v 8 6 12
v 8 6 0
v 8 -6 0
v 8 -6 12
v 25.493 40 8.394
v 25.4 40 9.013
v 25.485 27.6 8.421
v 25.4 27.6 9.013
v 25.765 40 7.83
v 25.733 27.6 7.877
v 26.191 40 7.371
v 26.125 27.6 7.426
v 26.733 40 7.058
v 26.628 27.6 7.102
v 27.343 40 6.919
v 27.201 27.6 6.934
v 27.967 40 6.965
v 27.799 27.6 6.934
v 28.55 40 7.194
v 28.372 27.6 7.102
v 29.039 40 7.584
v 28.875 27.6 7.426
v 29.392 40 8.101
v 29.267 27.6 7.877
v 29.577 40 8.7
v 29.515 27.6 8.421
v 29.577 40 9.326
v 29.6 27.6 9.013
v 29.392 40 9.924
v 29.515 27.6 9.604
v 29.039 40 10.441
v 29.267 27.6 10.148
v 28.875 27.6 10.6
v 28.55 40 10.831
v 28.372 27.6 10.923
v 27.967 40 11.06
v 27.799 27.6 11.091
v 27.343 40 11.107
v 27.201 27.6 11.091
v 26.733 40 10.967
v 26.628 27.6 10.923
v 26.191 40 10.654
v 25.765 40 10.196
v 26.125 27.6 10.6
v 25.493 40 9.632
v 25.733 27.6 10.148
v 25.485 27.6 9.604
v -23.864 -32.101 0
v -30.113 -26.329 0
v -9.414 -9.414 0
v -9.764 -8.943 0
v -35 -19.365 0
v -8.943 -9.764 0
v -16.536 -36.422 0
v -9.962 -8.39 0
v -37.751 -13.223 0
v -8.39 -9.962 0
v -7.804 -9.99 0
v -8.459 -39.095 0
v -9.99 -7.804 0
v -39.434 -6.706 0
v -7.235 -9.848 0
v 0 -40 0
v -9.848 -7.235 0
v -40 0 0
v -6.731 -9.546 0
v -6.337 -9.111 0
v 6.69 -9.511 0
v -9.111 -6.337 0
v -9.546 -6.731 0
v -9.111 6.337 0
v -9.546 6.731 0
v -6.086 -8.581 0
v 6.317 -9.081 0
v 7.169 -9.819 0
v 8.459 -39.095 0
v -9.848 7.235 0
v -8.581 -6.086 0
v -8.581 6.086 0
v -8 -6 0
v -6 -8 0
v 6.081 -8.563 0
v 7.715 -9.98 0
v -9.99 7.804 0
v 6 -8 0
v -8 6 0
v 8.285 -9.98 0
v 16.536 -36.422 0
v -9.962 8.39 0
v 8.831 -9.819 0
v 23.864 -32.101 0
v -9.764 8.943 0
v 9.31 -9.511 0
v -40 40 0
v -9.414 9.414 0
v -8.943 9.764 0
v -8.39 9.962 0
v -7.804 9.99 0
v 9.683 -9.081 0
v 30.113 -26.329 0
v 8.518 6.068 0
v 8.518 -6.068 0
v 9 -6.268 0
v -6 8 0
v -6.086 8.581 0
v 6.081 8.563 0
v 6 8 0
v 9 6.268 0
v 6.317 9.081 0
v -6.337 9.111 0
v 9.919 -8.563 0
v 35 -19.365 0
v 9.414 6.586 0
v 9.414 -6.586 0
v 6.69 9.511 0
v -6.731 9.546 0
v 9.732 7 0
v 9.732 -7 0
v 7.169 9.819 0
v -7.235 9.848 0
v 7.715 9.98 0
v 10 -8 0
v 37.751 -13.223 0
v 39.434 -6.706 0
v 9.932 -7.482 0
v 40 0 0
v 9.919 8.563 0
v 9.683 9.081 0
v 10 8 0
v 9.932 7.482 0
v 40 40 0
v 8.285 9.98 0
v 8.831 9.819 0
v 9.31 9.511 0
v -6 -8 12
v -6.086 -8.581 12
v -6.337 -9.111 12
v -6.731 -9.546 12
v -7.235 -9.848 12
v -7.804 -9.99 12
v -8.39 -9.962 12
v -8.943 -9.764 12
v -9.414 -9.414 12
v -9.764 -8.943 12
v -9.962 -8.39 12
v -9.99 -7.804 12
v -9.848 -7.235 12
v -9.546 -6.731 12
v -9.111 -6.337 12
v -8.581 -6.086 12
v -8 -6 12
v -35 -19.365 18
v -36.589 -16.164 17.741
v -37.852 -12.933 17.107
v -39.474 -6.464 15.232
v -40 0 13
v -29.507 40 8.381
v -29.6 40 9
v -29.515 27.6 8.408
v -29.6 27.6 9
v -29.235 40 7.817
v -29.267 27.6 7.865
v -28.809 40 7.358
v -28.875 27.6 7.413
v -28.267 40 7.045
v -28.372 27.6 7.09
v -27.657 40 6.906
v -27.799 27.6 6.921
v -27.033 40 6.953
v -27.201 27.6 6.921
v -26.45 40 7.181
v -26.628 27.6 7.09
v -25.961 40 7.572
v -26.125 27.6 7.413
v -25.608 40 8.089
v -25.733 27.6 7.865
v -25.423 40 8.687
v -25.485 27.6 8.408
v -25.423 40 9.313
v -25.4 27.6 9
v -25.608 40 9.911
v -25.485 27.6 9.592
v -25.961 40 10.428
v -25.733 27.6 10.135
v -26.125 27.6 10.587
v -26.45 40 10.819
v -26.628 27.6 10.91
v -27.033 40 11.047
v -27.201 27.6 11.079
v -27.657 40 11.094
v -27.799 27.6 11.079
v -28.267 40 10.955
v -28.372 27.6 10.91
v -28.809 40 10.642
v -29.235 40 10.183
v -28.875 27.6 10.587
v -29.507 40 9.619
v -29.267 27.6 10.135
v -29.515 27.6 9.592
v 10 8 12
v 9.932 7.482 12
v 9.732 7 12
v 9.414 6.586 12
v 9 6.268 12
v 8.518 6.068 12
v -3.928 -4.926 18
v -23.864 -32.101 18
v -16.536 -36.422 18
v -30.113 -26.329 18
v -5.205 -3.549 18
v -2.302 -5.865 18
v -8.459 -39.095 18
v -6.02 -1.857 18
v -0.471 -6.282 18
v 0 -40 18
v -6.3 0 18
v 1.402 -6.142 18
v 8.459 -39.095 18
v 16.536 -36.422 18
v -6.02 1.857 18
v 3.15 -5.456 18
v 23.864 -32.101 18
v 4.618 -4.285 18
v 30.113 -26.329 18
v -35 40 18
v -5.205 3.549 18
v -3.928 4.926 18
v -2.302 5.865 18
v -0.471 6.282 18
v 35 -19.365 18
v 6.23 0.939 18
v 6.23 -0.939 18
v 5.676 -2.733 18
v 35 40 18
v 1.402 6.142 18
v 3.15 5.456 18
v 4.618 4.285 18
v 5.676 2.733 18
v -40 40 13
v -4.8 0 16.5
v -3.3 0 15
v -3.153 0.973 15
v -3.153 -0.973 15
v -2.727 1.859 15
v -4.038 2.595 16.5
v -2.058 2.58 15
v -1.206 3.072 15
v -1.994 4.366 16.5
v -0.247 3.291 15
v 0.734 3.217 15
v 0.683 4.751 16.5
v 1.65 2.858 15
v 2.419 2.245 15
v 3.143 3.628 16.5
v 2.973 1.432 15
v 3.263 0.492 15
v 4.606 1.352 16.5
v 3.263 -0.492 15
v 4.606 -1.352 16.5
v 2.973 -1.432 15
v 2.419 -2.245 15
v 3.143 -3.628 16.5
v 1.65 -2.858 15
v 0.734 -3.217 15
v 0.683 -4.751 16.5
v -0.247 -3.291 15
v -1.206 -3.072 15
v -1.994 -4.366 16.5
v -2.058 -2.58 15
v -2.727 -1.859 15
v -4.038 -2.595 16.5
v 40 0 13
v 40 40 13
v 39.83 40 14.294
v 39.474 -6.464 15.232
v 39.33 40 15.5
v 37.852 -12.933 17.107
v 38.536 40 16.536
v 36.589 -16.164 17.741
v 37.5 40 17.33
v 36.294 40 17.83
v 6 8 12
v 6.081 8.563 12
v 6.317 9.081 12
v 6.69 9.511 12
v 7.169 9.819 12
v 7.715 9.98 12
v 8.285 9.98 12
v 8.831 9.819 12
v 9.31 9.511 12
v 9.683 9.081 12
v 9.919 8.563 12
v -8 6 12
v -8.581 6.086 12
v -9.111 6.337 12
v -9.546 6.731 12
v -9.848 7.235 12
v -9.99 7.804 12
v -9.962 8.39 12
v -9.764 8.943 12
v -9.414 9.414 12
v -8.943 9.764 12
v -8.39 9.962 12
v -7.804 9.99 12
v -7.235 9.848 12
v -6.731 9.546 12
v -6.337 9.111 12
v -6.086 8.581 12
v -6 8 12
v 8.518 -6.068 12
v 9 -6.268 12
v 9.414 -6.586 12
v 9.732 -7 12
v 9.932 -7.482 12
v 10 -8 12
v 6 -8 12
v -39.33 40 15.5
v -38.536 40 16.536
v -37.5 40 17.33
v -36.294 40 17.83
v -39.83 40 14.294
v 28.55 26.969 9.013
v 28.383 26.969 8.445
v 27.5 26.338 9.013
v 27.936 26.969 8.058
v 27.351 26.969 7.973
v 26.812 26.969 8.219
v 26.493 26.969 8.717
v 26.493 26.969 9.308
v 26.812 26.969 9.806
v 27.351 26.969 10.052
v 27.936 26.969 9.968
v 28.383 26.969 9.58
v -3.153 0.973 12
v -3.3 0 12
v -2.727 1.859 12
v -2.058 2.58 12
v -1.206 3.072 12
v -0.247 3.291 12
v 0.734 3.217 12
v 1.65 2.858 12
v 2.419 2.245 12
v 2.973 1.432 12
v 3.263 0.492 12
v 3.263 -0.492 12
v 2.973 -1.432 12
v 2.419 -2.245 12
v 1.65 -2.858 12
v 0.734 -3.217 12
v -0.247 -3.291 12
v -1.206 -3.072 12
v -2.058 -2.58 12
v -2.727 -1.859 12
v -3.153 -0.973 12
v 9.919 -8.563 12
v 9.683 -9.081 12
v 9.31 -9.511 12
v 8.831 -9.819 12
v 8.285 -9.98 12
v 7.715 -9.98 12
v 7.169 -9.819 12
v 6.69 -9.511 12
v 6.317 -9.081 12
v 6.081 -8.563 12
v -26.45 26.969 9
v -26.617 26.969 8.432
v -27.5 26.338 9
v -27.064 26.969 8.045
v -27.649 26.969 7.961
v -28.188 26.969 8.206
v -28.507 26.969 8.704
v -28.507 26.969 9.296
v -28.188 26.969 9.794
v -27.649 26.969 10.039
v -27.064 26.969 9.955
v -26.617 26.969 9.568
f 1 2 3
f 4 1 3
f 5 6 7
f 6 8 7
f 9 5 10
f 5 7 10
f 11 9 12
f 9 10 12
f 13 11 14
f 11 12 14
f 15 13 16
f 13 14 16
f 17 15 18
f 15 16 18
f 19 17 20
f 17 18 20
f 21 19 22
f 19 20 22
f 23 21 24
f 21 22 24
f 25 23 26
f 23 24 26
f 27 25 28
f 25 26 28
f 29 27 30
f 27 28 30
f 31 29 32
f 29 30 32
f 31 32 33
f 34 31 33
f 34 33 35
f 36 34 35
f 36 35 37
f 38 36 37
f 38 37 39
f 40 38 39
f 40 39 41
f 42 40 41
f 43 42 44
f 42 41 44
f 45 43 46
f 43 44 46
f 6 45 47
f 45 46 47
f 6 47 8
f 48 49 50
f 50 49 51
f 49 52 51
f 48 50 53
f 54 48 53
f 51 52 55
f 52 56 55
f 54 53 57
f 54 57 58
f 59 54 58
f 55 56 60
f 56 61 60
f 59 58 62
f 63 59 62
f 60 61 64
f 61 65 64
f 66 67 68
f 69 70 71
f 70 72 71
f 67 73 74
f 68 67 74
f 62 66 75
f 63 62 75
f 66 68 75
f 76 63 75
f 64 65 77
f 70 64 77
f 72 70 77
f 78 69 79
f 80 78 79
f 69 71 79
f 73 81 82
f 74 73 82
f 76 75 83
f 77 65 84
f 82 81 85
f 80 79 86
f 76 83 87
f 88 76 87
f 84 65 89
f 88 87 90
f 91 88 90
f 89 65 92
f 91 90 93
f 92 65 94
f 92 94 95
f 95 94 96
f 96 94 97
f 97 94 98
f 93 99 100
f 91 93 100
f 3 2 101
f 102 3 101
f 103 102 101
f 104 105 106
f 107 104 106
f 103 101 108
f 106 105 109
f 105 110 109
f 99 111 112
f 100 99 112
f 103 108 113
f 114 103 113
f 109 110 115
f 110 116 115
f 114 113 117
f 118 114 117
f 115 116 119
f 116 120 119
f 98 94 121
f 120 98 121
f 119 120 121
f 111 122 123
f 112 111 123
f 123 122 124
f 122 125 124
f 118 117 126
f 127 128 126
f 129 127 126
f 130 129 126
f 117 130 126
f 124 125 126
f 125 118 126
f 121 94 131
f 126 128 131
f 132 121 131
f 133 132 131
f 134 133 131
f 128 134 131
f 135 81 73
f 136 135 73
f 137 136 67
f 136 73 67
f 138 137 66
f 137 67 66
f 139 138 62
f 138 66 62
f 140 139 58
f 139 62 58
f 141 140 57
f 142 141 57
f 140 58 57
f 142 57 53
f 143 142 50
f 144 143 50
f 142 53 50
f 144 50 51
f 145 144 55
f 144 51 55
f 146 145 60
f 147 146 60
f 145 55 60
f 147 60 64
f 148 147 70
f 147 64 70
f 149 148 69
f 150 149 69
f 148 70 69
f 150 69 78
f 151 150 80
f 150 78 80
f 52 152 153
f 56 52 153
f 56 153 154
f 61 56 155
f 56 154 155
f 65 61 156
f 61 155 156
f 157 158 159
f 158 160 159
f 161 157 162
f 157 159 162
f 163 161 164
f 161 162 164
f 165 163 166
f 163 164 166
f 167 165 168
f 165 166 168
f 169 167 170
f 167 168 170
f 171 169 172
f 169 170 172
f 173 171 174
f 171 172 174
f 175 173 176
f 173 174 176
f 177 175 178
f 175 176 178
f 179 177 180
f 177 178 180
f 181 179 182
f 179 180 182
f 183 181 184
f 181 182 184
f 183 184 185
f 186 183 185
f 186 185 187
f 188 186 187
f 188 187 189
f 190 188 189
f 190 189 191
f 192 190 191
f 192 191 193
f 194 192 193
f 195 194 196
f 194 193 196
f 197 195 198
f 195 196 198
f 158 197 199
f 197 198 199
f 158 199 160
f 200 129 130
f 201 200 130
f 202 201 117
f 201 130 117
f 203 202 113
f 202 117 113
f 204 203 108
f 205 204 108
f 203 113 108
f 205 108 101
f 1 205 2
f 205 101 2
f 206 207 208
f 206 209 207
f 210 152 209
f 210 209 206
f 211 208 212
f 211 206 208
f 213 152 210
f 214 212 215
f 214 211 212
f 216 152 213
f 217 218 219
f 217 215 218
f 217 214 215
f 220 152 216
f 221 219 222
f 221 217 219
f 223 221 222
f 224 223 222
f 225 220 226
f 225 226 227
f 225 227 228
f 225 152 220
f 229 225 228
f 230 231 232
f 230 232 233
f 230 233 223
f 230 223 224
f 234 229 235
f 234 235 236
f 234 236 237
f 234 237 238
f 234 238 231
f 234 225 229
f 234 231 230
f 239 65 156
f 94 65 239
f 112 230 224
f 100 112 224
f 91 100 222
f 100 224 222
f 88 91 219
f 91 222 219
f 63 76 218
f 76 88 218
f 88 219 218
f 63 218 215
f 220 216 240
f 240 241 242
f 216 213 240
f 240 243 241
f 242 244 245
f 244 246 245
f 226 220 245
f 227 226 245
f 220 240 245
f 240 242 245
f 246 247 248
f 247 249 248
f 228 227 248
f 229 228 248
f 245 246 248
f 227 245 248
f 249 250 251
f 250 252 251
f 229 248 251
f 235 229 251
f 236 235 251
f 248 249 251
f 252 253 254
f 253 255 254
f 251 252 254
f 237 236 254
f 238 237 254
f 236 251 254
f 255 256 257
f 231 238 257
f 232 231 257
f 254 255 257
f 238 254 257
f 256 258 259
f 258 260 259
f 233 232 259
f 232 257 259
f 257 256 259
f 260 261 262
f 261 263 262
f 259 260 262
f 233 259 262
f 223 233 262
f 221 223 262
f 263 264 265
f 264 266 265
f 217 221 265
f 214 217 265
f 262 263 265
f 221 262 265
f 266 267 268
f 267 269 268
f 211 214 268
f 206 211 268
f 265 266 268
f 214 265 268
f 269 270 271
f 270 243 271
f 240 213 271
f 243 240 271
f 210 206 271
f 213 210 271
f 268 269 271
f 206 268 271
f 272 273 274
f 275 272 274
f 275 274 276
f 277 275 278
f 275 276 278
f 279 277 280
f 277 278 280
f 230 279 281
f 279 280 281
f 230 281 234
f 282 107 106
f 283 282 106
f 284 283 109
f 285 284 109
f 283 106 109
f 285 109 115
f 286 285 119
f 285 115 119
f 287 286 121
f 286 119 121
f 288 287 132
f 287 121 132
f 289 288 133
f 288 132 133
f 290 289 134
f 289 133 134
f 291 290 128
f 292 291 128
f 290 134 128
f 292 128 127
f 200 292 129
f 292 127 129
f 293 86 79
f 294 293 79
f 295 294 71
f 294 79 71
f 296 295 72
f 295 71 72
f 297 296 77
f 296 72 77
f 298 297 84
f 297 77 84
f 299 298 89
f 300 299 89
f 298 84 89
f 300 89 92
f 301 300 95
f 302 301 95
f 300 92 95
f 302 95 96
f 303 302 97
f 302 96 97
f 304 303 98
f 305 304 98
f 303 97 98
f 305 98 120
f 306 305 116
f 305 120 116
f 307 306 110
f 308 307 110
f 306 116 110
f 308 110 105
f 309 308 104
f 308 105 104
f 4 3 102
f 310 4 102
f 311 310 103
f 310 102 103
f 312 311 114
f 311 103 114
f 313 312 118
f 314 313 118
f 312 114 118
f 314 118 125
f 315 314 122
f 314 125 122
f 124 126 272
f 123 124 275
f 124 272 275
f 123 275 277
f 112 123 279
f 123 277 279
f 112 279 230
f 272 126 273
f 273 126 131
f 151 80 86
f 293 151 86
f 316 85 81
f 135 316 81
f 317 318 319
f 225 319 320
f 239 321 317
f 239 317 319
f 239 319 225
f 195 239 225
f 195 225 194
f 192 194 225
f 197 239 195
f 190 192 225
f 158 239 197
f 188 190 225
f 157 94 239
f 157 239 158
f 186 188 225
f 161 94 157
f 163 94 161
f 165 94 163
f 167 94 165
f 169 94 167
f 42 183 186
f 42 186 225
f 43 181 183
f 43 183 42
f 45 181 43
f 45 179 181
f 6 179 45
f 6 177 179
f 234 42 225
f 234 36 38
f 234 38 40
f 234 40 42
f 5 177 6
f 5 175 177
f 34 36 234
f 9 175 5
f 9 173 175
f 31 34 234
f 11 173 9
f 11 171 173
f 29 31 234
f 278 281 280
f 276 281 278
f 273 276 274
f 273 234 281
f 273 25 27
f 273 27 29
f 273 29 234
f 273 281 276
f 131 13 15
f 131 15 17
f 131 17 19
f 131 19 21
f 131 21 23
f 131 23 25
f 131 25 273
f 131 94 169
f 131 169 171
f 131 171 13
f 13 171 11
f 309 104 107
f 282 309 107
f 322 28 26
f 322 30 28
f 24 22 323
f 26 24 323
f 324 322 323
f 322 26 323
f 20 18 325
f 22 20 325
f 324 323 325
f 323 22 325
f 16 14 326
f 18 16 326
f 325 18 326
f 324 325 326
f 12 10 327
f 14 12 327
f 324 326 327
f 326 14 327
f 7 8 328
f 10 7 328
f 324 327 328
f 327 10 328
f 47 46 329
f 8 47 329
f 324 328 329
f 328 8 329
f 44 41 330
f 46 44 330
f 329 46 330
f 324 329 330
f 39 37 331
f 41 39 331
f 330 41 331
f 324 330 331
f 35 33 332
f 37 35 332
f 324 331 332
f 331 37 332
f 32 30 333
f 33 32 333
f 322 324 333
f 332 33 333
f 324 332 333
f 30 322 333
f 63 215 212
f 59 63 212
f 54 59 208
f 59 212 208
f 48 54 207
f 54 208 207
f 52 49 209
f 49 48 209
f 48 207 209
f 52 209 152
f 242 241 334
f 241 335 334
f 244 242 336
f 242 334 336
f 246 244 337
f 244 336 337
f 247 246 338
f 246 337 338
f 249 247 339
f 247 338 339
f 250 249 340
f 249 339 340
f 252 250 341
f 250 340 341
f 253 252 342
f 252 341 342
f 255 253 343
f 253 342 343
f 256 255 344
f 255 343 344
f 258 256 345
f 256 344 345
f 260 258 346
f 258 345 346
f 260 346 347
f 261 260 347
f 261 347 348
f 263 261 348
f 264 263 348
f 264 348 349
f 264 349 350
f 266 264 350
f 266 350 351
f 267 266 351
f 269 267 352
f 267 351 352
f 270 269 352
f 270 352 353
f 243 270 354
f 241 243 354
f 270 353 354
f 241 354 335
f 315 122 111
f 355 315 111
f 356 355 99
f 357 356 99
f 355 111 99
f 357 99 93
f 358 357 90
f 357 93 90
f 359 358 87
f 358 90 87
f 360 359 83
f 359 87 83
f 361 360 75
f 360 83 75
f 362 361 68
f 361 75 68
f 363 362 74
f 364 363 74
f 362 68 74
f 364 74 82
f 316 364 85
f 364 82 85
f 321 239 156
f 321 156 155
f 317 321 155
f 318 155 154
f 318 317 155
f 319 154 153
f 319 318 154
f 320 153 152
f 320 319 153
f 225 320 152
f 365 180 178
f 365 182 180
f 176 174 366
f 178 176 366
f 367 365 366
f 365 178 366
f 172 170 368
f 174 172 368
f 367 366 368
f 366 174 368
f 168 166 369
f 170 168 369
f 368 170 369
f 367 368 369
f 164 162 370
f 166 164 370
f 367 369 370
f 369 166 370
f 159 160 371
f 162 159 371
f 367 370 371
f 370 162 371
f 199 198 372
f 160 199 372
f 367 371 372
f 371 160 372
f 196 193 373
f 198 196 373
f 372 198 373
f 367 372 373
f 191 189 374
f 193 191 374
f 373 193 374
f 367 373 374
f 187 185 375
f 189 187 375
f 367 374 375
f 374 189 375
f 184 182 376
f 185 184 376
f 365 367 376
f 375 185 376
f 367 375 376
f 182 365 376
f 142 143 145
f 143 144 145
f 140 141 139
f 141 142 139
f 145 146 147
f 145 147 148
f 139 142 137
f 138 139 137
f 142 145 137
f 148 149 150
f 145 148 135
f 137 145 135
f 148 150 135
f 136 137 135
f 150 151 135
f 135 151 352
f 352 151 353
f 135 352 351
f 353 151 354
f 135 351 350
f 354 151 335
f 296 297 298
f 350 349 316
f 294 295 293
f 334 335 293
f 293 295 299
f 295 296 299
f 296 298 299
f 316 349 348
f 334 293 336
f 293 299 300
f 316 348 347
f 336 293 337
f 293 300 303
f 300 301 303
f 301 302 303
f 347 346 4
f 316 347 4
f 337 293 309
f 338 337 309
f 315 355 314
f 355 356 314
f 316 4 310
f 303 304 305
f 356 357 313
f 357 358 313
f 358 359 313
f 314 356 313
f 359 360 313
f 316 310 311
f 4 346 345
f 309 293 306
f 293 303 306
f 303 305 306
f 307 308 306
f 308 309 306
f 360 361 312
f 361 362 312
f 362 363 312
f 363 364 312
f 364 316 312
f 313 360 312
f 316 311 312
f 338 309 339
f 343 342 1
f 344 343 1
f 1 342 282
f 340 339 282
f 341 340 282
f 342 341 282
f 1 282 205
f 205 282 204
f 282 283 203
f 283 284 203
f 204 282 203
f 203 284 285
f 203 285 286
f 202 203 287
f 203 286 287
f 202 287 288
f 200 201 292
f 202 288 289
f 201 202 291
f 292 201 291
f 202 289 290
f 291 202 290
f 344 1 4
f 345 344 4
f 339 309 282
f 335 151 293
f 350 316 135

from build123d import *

# Parameters (mm, degrees)
SKETCH1_W                                           = 80
SKETCH1_H                                           = 80
BOSS_EXTRUDE1_DEPTH                                 = 12
SKETCH2_W                                           = 80
SKETCH2_H                                           = 80
SKETCH2_R                                           = 1.5
BOSS_EXTRUDE2_DEPTH                                 = 6
CSK_FOR_M6_COUNTERSUNK_FLAT_HEAD_SCREW1_D           = 6.6
CSK_FOR_M6_COUNTERSUNK_FLAT_HEAD_SCREW1_DEPTH       = 10
CSK_FOR_M6_COUNTERSUNK_FLAT_HEAD_SCREW1_CSINK_D     = 12.6
CSK_FOR_M6_COUNTERSUNK_FLAT_HEAD_SCREW1_CSINK_ANGLE = 90
CSK_FOR_M6_COUNTERSUNK_FLAT_HEAD_SCREW1_TIP         = 1.982840043
FILLET1_R                                           = 5
M5_TAPPED_HOLE1_D                                   = 4.2
M5_TAPPED_HOLE1_DEPTH                               = 12.4
M5_TAPPED_HOLE1_TIP                                 = 1.2618073
CUT_EXTRUDE1_DEPTH                                  = 60.363288319


with BuildPart() as part:
    # Sketch1 → Boss-Extrude1 (new body)
    with BuildSketch(Plane.XY):
        Rectangle(SKETCH1_W, SKETCH1_H)
        with BuildLine():
            Line((6, -8), (-6, -8))
            ThreePointArc((-6, -8), (-9.414213562, -9.414213562), (-8, -6))
            Line((-8, -6), (-8, 6))
            ThreePointArc((-8, 6), (-9.414213562, 9.414213562), (-6, 8))
            Line((-6, 8), (6, 8))
            ThreePointArc((6, 8), (8, 10), (10, 8))
            ThreePointArc((10, 8), (9.414213562, 6.585786438), (8, 6))
            Line((8, 6), (8, -6))
            ThreePointArc((8, -6), (9.414213562, -6.585786438), (10, -8))
            ThreePointArc((10, -8), (8, -10), (6, -8))
        make_face(mode=Mode.SUBTRACT)
    extrude(amount=BOSS_EXTRUDE1_DEPTH)

    # Sketch2 → Boss-Extrude2 (add)
    with BuildSketch(Plane.XY.offset(12)):
        Rectangle(SKETCH2_W, SKETCH2_H)
        Circle(SKETCH2_R, mode=Mode.SUBTRACT)
    extrude(amount=BOSS_EXTRUDE2_DEPTH)

    # CSK for M6 Countersunk Flat Head Screw1
    with Locations(Plane.XY.offset(18)):
        with Locations((0, 0)):
            CounterSinkHole(CSK_FOR_M6_COUNTERSUNK_FLAT_HEAD_SCREW1_D / 2, CSK_FOR_M6_COUNTERSUNK_FLAT_HEAD_SCREW1_CSINK_D / 2, depth=CSK_FOR_M6_COUNTERSUNK_FLAT_HEAD_SCREW1_DEPTH, counter_sink_angle=CSK_FOR_M6_COUNTERSUNK_FLAT_HEAD_SCREW1_CSINK_ANGLE)
            with Locations((0, 0, -(CSK_FOR_M6_COUNTERSUNK_FLAT_HEAD_SCREW1_DEPTH + CSK_FOR_M6_COUNTERSUNK_FLAT_HEAD_SCREW1_TIP / 2))):  # 118° drill point
                Cone(0, CSK_FOR_M6_COUNTERSUNK_FLAT_HEAD_SCREW1_D / 2, CSK_FOR_M6_COUNTERSUNK_FLAT_HEAD_SCREW1_TIP, mode=Mode.SUBTRACT)

    # Fillet1
    fillet1_edges = [part.edges().sort_by_distance(p)[0] for p in [
        (-40, 0, 18),
        (40, 0, 18),
    ]]
    fillet(fillet1_edges, radius=FILLET1_R)

    # M5 Tapped Hole1
    with Locations(Plane(origin=(0, 40, 0), x_dir=(1, 0, 0), z_dir=(0, 1, 0))):
        with Locations((-27.5, -9), (27.5, -9.012634245)):
            Hole(M5_TAPPED_HOLE1_D / 2, depth=M5_TAPPED_HOLE1_DEPTH)
            with Locations((0, 0, -(M5_TAPPED_HOLE1_DEPTH + M5_TAPPED_HOLE1_TIP / 2))):  # 118° drill point
                Cone(0, M5_TAPPED_HOLE1_D / 2, M5_TAPPED_HOLE1_TIP, mode=Mode.SUBTRACT)

    # Sketch7 → Cut-Extrude1 (cut, through all)
    with BuildSketch(Plane.XY.offset(18)):
        with BuildLine():
            ThreePointArc((0, -40), (-20.315060063, -34.457195687), (-35, -19.364916731))
            Line((-35, -19.364916731), (-35, -40))
            Line((-35, -40), (0, -40))
        make_face()
        with BuildLine():
            ThreePointArc((-35, -19.364916731), (-38.729833462, -10), (-40, 0))
            Line((-40, 0), (-40, -40))
            Line((-40, -40), (-35, -40))
            Line((-35, -40), (-35, -19.364916731))
        make_face()
        with BuildLine():
            ThreePointArc((35, -19.364916731), (20.315060063, -34.457195687), (0, -40))
            Line((0, -40), (35, -40))
            Line((35, -40), (35, -19.364916731))
        make_face()
        with BuildLine():
            Line((35, -19.364916731), (35, -40))
            Line((35, -40), (40, -40))
            Line((40, -40), (40, 0))
            ThreePointArc((40, 0), (38.729833462, -10), (35, -19.364916731))
        make_face()
    extrude(amount=-CUT_EXTRUDE1_DEPTH, mode=Mode.SUBTRACT)


solid = part.part
